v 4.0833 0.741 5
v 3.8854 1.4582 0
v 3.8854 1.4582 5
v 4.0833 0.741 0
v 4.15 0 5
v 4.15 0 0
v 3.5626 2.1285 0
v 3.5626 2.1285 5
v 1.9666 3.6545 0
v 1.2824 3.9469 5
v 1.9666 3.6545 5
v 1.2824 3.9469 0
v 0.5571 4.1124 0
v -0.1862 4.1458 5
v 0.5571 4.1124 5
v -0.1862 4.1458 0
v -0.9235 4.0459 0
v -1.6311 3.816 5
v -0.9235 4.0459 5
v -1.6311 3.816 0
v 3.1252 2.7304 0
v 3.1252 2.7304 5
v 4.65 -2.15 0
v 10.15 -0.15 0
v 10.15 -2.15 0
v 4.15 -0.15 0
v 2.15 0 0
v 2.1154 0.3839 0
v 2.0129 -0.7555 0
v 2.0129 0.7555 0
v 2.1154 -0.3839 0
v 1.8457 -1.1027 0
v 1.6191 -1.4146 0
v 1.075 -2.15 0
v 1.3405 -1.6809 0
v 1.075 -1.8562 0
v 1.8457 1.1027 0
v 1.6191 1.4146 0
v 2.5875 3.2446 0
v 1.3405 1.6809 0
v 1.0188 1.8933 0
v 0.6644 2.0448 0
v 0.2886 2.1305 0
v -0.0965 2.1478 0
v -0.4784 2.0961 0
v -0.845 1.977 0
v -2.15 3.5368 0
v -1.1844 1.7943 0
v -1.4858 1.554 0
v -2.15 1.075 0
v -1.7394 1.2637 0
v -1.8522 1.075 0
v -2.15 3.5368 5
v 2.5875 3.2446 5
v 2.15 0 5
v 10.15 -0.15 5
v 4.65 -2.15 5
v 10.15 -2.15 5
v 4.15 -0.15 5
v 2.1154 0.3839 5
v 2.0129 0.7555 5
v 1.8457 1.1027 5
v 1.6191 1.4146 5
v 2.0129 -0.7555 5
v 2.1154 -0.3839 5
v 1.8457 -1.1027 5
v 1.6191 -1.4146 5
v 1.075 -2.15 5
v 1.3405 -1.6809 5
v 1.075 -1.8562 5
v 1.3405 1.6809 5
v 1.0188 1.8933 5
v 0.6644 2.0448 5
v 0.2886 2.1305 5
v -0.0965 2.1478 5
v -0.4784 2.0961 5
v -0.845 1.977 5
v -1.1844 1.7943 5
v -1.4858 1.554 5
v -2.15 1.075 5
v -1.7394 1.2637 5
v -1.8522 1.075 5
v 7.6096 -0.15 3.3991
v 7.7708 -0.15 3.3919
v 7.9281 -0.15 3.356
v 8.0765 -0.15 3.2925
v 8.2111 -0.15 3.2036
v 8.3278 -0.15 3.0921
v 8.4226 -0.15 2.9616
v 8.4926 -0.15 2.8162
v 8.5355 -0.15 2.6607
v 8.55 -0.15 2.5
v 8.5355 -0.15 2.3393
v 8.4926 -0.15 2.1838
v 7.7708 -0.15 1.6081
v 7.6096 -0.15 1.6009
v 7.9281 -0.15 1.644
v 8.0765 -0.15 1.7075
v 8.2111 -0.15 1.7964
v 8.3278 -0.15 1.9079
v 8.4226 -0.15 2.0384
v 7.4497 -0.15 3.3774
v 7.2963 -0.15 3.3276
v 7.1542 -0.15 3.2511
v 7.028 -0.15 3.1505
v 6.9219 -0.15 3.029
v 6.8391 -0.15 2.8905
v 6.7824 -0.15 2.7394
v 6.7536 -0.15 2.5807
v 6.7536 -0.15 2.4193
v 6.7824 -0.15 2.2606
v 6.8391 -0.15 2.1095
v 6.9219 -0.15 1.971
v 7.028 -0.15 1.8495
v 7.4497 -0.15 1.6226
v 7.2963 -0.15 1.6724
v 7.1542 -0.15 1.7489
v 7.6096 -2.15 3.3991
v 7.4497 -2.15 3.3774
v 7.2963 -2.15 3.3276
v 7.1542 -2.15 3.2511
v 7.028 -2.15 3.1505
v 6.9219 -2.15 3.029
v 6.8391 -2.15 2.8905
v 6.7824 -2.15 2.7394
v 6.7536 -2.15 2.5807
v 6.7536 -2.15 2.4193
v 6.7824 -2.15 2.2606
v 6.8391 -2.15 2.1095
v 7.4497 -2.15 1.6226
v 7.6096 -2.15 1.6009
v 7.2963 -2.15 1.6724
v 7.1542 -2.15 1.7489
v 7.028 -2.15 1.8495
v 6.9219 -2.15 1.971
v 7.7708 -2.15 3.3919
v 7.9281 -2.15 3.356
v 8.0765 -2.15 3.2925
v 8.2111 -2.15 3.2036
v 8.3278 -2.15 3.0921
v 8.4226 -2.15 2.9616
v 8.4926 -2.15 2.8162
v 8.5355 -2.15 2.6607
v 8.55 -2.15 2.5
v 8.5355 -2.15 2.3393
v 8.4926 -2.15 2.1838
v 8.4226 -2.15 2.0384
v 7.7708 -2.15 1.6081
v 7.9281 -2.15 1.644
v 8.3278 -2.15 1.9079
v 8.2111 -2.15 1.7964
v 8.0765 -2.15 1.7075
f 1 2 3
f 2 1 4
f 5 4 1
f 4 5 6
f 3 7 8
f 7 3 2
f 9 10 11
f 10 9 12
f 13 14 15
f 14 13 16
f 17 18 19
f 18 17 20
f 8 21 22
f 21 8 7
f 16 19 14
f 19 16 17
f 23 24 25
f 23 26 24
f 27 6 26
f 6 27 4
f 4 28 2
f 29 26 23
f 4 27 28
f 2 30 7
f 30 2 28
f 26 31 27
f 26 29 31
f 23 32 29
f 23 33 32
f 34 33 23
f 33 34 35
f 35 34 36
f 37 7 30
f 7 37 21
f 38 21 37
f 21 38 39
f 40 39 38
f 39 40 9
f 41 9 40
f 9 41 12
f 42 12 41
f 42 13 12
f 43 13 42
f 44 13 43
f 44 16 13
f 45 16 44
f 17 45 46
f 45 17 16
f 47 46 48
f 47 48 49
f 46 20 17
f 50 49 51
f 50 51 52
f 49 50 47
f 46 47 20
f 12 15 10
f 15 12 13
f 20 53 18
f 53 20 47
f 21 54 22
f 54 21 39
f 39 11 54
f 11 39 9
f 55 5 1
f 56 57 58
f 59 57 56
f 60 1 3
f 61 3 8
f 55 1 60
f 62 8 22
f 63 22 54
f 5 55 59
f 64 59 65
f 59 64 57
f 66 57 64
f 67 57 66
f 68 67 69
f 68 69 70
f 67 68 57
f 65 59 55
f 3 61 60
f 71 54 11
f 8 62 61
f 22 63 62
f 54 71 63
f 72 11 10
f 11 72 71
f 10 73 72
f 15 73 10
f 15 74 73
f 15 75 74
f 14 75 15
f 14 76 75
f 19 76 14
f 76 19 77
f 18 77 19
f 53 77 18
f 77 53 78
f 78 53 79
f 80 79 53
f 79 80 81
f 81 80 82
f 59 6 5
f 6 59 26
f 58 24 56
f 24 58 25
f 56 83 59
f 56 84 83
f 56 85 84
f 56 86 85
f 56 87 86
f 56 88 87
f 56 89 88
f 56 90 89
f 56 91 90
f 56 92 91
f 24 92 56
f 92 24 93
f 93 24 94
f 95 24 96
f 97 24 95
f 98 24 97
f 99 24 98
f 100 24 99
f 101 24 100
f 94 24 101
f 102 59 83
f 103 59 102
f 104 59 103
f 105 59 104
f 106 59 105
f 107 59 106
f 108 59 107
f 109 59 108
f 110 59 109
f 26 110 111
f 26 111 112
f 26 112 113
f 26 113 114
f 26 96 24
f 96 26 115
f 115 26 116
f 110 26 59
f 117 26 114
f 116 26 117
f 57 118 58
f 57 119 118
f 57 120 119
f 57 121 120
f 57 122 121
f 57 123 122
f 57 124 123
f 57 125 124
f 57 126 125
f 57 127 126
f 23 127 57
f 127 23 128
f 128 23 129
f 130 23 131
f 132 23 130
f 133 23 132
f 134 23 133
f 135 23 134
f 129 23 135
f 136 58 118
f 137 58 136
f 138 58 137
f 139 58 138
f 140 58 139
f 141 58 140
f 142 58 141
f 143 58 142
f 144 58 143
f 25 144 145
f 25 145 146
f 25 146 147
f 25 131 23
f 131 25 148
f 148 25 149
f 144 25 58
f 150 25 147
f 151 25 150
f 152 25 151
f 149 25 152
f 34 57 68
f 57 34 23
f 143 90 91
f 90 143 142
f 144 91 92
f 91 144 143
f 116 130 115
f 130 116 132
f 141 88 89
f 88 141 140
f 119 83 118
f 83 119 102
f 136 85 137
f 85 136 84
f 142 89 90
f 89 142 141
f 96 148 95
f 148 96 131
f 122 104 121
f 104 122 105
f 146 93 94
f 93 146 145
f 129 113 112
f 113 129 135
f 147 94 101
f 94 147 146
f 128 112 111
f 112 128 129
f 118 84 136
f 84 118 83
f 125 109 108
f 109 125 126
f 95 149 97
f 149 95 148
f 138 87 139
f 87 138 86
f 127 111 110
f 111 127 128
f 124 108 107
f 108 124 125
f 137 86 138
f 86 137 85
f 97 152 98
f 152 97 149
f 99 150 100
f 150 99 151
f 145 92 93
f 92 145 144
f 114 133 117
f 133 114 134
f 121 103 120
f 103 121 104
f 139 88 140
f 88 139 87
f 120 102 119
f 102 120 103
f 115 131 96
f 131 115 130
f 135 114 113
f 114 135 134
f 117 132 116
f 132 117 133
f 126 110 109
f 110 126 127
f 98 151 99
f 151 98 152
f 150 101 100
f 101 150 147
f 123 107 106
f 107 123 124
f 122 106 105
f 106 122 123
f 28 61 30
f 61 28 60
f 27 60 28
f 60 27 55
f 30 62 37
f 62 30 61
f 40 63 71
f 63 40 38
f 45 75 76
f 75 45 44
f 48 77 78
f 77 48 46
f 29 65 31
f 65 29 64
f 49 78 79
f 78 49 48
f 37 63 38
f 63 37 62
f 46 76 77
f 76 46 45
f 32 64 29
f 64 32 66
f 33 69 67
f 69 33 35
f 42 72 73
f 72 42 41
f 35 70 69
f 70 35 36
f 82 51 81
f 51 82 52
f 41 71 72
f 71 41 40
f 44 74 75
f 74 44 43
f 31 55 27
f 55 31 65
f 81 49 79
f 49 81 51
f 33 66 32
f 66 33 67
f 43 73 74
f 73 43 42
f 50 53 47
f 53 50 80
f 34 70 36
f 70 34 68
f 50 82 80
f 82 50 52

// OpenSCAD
/*
 * Corner Cable Clip (Parametric), v0.42
 *
 * by Alex Franke (CodeCreations), Dec 2012
 * http://www.theFrankes.com
 * 
 * Licenced under Creative Commons Attribution - Non-Commercial - Share Alike 3.0 
 * 
 * DESCRIPTION: Holds a cable into a corner with a single nail.  
 * 
 * INSTRUCTIONS: Change "User-defined values" to suit your needs and print. Attach with a single nail. 
 * 
 * v0.69, Dec 30, 2012: Fixed a bug that caused the nail hole to be placed too close the body 
 *   on short tabs. 
 * v0.42, Dec 30, 2012: Initial Release.
 * 
 * TODO: 
 *   * None at this time. 
 */


/////////////////////////////////////////////////////////////////////////////
// User-defined values... 
/////////////////////////////////////////////////////////////////////////////

cableDiameter  = 4.3; // The diameter of the cable to be clipped 
nailDiameter   = 1.8; // The diameter of the nail or screw used to fasten the clip down

width          = 5;   // The overall width of the cable clip
tabLength      = 6;   // The length of the tab the nail goes through

thickness      = 2;   // The thickness of the clip 

$fn            = 35;  // General curve quality


/////////////////////////////////////////////////////////////////////////////
// The code...
/////////////////////////////////////////////////////////////////////////////

radius = cableDiameter/2+thickness; 
cutcube = [radius*2+1,radius*2+1,width+1]; // used for trimming the piece down to size 

difference() {
	union() {
		cylinder(h=width,r=radius);

		// close circle
		translate([0,-radius,0]) 
			cube([radius, radius, width]);

		// tab
		translate([radius,-radius+thickness,0]) 
			cube([tabLength, thickness, width]);
	}

	// Nail hole 
	translate([radius+tabLength-min(width/2,tabLength/2),0,width/2]) 
		rotate([90,0,0]) 
			cylinder(h=radius*2+1,r=nailDiameter/2, center=true);

	// Cable hole 
	translate([0,0,width/2]) 
		cylinder(h=width+1,r=cableDiameter/2,center=true);

	// Cut out the rest 
	translate([-cutcube[0]/2,-cutcube[1]-cableDiameter/2,-0.5]) 
		cube(cutcube);
	translate([-cutcube[0]-cableDiameter/2,-cutcube[1]/2,-0.5]) 
		cube(cutcube);
	translate([-cutcube[0]+cableDiameter/4,-cutcube[1]+cableDiameter/4,-0.5]) 
		cube(cutcube);
}
